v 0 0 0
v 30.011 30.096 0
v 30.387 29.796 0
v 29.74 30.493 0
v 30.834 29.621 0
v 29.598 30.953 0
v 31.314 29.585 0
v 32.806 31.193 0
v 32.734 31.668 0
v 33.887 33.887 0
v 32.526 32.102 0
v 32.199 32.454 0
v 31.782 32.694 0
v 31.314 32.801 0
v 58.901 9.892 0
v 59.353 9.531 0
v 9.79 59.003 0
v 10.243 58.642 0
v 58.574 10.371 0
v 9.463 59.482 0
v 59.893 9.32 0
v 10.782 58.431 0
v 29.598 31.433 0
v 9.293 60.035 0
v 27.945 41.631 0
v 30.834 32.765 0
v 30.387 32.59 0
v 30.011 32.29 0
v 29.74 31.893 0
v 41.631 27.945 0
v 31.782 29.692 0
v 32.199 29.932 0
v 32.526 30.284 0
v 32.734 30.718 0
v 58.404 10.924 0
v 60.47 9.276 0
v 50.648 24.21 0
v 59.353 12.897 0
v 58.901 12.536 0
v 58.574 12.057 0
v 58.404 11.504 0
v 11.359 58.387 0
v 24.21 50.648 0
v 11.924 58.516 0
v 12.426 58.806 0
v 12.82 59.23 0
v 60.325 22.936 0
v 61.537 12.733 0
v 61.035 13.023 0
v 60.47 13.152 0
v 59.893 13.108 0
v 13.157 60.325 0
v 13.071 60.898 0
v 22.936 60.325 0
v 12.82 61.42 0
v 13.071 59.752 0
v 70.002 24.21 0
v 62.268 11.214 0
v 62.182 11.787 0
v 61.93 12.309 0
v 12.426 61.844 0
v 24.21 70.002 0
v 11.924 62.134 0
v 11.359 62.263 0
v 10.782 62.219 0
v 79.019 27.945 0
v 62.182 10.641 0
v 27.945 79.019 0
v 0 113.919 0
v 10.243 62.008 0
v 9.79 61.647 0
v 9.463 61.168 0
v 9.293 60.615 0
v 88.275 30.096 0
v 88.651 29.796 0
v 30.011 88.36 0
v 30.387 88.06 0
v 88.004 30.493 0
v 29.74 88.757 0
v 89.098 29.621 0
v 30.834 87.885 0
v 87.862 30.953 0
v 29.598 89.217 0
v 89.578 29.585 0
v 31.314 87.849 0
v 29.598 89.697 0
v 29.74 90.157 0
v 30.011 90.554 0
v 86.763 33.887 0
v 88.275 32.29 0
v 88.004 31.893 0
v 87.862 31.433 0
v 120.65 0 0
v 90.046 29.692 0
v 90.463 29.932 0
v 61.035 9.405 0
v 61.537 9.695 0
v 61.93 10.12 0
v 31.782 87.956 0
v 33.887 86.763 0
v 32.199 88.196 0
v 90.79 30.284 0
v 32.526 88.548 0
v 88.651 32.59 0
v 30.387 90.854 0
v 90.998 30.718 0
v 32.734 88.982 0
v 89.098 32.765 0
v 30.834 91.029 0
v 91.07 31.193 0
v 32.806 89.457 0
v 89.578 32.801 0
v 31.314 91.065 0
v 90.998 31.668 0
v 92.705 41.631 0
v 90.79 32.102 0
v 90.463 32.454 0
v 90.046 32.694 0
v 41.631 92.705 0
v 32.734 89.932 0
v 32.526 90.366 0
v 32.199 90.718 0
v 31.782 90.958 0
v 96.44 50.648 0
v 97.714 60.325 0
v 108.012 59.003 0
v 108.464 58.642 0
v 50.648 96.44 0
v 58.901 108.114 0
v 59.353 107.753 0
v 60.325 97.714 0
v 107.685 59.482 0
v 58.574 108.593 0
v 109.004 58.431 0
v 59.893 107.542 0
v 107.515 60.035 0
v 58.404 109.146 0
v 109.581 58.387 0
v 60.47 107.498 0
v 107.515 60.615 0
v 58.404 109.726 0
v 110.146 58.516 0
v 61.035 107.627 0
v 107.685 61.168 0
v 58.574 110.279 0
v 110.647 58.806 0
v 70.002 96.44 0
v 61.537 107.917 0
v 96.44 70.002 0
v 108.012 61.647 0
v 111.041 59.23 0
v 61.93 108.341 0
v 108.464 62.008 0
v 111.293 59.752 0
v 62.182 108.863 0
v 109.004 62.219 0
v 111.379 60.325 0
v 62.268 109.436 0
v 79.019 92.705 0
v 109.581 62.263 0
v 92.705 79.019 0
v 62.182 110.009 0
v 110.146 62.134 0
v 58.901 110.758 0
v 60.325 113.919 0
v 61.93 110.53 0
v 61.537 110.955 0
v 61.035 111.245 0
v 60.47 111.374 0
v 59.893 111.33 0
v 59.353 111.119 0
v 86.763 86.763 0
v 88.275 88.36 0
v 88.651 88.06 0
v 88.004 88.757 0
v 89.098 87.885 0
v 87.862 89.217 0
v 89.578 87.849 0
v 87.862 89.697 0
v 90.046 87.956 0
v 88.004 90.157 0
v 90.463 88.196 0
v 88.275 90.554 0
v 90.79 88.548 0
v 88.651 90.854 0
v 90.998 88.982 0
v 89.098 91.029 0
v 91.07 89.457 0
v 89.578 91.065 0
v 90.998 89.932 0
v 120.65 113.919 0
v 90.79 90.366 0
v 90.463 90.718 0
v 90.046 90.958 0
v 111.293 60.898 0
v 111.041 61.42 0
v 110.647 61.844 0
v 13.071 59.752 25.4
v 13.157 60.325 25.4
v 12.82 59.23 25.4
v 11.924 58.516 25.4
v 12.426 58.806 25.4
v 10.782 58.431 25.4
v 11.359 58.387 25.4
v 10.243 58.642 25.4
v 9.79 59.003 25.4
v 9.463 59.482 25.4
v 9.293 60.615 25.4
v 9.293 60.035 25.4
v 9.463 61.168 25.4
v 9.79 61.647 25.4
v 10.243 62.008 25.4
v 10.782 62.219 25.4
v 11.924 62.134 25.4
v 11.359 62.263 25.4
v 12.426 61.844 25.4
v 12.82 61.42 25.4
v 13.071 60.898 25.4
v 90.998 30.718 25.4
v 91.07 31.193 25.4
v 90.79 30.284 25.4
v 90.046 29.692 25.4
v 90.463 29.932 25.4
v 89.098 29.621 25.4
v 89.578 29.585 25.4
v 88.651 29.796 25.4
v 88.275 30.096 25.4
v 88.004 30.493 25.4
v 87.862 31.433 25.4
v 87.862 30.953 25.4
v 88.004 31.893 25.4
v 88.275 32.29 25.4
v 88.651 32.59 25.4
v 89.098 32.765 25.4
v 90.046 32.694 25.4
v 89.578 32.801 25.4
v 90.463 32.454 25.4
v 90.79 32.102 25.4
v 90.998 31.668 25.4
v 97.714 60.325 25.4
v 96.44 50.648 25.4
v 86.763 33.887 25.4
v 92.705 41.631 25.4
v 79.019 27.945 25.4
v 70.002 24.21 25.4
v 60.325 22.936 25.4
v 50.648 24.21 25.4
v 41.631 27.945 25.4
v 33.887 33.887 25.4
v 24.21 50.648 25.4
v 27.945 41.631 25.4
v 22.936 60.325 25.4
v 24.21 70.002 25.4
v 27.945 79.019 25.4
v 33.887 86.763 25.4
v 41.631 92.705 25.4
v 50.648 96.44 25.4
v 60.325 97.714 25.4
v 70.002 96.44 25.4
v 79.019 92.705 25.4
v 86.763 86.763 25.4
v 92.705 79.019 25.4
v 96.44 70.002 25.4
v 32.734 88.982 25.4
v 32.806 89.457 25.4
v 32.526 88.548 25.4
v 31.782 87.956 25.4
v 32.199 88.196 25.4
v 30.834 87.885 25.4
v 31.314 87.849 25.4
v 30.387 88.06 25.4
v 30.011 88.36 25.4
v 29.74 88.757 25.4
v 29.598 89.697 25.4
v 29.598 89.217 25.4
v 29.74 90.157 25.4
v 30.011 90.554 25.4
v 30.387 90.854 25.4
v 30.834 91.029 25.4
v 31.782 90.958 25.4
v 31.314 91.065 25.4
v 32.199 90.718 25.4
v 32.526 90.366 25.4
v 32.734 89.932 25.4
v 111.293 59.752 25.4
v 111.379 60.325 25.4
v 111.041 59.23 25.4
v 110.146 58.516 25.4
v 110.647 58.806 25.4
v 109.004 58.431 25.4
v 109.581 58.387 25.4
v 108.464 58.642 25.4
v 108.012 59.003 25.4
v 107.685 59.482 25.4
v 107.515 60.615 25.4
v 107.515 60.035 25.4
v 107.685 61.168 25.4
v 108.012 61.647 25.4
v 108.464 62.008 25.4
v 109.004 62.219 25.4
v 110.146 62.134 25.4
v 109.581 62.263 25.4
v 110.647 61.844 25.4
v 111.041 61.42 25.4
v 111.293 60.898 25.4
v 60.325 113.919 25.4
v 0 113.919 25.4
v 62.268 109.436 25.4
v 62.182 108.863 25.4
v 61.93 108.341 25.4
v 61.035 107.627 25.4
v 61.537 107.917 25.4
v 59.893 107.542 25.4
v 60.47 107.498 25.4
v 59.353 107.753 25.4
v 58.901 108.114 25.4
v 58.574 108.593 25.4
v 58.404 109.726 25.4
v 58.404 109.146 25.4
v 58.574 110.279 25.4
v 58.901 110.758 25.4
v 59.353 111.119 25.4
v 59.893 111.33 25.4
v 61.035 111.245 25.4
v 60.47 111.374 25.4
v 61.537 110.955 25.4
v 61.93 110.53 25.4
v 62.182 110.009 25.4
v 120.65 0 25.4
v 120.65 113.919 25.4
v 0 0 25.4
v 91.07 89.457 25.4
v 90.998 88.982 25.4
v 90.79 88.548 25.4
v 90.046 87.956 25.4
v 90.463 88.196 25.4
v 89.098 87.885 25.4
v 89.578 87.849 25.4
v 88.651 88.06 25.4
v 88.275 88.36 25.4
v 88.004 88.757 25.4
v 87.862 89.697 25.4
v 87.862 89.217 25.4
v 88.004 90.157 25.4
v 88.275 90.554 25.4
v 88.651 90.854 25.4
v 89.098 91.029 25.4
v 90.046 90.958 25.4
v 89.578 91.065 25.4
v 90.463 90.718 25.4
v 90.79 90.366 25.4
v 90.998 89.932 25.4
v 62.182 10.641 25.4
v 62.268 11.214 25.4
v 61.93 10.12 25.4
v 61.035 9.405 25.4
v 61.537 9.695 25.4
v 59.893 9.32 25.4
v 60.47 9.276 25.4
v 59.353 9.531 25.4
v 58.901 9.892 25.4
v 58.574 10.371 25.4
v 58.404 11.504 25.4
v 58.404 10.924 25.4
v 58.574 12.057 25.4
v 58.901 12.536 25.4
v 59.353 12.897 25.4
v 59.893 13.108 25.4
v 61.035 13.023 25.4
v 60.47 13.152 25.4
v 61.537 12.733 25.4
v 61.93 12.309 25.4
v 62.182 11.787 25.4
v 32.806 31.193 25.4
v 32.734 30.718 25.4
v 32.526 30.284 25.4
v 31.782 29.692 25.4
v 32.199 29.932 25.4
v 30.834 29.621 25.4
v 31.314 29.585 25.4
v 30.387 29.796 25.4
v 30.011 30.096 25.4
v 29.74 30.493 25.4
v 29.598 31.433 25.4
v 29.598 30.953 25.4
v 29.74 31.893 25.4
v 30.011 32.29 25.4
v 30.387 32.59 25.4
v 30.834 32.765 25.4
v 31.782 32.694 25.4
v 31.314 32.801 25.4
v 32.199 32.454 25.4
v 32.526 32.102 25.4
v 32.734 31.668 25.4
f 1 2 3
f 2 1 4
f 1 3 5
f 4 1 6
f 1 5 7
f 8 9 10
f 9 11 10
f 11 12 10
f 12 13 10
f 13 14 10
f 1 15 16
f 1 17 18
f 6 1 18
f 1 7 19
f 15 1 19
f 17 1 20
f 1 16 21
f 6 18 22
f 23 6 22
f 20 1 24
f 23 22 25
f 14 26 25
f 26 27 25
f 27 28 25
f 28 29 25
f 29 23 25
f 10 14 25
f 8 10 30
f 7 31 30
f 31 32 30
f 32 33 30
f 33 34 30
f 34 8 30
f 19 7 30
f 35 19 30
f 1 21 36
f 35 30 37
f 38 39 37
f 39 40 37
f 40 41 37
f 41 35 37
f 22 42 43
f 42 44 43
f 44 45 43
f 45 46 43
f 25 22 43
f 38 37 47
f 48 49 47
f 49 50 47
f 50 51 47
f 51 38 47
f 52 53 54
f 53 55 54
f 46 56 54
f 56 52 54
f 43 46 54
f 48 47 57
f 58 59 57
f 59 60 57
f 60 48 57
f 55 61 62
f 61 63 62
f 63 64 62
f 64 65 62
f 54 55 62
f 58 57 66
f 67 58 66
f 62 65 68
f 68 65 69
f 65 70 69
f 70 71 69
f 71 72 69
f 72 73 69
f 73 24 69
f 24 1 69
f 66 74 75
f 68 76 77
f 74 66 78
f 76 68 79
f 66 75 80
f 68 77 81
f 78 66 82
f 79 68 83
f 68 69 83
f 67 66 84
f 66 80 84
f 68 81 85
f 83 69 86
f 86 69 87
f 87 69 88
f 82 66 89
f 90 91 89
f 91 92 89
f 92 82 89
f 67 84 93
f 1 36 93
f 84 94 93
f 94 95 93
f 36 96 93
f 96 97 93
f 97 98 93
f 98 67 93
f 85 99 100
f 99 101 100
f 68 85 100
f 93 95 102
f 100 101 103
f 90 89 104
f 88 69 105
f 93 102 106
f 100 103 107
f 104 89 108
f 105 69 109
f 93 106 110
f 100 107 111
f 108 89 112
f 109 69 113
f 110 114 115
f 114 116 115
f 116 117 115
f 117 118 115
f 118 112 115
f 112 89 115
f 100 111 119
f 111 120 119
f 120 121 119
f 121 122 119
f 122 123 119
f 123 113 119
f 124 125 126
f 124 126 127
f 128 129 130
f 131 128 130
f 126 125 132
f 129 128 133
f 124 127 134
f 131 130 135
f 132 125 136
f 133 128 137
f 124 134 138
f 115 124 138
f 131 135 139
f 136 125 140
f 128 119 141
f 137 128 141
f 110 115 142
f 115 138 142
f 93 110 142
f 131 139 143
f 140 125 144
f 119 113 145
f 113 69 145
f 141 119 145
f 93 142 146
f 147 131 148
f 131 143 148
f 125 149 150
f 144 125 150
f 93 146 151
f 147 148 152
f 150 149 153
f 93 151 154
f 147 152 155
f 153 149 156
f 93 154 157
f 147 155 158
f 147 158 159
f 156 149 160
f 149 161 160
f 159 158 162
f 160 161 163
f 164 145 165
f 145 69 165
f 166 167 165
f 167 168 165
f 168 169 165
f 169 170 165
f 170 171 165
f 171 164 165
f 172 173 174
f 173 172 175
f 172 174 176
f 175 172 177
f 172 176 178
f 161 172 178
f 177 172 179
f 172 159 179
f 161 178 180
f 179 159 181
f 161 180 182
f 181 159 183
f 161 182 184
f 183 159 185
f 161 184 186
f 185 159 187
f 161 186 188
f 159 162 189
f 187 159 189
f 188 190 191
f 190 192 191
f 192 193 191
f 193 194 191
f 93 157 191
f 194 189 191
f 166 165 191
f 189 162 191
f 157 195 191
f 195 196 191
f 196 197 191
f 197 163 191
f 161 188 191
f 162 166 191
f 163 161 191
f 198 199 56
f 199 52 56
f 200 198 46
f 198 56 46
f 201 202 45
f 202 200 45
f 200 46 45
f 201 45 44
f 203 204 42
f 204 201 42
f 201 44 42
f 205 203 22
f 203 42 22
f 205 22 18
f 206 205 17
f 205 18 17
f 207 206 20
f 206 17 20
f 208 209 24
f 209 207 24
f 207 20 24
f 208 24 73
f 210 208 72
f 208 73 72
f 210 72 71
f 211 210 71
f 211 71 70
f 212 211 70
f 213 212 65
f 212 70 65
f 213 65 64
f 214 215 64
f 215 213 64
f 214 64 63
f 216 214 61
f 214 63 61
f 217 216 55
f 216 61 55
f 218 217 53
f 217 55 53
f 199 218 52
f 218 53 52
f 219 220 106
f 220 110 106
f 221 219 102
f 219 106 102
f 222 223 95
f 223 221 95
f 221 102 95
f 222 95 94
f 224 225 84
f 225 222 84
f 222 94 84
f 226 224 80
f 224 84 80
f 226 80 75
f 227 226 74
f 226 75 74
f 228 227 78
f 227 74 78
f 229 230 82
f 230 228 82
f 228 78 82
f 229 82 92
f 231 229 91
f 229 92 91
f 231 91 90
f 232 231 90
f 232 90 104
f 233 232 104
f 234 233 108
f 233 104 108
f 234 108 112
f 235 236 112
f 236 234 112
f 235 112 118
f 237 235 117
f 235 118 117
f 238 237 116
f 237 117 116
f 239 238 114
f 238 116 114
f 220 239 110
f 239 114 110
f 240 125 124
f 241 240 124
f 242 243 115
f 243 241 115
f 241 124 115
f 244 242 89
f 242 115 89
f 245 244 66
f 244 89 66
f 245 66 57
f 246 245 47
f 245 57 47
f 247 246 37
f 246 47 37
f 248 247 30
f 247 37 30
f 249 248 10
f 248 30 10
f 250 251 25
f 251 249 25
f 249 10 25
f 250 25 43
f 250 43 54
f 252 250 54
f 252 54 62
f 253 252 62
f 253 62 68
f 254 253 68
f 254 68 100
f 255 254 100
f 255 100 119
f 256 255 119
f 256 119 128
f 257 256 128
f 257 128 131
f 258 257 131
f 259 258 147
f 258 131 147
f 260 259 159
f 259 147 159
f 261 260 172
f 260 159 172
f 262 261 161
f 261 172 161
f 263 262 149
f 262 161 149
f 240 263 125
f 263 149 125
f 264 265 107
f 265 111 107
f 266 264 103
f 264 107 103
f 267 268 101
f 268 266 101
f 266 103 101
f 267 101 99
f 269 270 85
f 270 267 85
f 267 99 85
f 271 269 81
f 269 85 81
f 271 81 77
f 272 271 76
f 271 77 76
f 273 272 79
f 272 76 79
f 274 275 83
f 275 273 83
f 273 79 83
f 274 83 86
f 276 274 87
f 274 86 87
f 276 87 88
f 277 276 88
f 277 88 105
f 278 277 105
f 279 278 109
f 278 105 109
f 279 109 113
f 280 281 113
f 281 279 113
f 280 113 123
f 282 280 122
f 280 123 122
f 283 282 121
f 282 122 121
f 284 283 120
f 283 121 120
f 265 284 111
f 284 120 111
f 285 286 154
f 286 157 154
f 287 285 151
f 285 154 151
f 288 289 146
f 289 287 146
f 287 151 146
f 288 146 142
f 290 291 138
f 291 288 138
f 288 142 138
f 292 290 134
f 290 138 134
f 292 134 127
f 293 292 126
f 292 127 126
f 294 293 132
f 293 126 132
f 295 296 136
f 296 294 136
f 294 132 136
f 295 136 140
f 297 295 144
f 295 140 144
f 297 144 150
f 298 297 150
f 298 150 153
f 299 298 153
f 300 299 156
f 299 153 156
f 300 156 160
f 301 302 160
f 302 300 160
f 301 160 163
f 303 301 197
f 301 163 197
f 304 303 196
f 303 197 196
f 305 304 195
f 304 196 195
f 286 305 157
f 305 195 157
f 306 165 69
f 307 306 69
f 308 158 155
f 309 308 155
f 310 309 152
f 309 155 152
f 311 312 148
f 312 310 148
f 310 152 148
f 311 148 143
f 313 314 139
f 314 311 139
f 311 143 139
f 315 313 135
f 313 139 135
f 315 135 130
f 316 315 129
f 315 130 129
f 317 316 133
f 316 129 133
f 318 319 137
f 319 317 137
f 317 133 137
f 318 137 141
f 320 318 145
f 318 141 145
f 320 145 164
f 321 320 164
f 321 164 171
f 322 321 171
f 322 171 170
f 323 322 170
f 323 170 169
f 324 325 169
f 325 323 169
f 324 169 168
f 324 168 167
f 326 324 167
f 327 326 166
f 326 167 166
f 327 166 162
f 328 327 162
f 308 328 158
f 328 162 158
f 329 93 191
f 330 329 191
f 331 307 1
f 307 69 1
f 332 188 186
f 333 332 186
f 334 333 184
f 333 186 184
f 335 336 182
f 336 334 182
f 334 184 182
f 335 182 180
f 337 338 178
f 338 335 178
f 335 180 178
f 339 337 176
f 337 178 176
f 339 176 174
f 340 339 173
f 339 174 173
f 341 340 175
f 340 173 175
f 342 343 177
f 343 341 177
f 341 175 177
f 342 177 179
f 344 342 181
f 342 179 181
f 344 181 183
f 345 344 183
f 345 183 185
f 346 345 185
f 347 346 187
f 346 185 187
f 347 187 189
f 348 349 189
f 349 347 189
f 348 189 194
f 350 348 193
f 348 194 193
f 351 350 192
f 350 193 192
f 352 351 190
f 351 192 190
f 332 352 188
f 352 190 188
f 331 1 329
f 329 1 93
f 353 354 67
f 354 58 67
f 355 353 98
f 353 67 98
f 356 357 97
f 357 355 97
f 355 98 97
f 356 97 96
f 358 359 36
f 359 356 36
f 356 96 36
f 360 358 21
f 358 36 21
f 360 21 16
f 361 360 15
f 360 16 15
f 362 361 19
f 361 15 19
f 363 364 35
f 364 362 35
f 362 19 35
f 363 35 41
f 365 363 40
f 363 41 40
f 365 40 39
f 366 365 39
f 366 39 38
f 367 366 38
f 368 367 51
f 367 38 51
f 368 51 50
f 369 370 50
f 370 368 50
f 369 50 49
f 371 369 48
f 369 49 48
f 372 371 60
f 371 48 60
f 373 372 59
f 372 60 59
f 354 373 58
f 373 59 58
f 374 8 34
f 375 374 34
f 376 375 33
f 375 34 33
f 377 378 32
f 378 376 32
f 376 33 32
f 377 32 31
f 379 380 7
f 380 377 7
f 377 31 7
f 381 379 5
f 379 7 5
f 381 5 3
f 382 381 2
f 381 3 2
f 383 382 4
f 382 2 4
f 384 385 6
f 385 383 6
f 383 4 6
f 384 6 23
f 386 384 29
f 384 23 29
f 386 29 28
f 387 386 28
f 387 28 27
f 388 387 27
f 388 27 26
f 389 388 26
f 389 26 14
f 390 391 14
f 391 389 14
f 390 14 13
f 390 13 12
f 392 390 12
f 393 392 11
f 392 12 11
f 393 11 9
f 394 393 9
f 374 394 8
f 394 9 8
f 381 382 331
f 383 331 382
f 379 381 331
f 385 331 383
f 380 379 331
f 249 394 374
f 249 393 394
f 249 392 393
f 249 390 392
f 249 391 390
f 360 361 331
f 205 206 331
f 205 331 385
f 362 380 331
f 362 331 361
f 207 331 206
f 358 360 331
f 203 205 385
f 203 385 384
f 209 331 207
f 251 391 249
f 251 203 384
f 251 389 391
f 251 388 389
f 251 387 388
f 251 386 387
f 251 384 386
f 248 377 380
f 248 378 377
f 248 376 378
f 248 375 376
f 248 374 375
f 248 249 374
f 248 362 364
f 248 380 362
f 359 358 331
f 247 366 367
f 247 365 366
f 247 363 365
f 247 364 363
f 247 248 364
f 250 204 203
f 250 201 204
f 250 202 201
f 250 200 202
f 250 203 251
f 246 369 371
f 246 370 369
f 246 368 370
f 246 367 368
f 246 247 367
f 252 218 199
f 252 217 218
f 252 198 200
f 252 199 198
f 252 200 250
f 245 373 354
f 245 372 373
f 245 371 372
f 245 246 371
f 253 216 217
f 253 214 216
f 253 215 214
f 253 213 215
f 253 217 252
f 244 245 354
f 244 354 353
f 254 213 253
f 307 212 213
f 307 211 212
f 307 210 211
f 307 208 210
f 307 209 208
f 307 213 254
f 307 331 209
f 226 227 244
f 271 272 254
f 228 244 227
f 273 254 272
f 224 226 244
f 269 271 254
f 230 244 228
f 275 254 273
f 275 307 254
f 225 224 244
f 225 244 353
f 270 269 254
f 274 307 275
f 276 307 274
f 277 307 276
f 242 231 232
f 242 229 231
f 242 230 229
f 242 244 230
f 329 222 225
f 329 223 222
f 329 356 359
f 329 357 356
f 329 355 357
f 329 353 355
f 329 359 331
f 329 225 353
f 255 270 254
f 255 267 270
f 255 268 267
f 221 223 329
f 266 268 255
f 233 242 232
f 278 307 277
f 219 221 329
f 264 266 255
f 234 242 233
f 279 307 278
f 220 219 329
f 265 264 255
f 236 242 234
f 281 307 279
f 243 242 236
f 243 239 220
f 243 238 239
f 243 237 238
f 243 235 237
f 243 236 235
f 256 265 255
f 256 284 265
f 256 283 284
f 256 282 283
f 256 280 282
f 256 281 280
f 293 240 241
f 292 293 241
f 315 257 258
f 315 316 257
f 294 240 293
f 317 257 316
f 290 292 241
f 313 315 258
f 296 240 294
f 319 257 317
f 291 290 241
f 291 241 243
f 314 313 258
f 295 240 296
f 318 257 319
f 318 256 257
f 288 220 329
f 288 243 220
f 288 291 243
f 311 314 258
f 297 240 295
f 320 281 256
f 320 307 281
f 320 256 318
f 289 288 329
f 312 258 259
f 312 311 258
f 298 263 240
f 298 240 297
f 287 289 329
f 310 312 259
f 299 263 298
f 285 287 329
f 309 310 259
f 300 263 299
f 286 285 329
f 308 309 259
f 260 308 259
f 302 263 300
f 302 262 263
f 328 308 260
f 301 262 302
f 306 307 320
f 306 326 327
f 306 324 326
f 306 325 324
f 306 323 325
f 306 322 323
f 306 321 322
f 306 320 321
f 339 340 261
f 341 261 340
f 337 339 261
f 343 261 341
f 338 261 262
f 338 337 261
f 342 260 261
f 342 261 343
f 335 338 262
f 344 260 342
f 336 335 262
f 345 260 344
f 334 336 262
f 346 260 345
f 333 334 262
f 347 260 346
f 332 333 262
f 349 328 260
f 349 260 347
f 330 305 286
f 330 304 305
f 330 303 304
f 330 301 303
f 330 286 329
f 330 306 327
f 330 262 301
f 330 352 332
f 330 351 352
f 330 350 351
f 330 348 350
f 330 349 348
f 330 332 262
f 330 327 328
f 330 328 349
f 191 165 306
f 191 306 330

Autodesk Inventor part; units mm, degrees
ref_plane "YZ Plane" through (0, 0, 0) normal (1, 0, 0) x (0, 1, 0)
ref_plane "XZ Plane" through (0, 0, 0) normal (0, 1, 0) x (-1, 0, 0)
ref_plane "XY Plane" through (0, 0, 0) normal (0, 0, 1) x (1, 0, 0)
sketch "Sketch1" plane through (0, 0, 0) normal (0, 0, 1) x (1, 0, 0)
  line L0 (0, 0) -> (120.65, 0)
  line L1 (120.65, 0) -> (120.65, 113.919)
  line L2 (0, 113.919) -> (0, 0)
  circle A0 centre (11.2141, 60.325) radius 1.9431
  circle A1 centre (60.325, 11.2141) radius 1.9431
  circle A2 centre (109.4359, 60.325) radius 1.9431
  circle A3 centre (60.325, 109.4359) radius 1.9431
  circle A4 centre (60.325, 60.325) radius 37.3888
  circle A5 centre (31.193, 89.457) radius 1.6129
  circle A6 centre (31.193, 31.193) radius 1.6129
  circle A7 centre (89.457, 31.193) radius 1.6129
  circle A8 centre (89.457, 89.457) radius 1.6129
  line L3 (60.325, 113.919) -> (120.65, 113.919)
  line L4 (60.325, 113.919) -> (0, 113.919)
  dimension "d10" = 3.8862
  dimension "d13" = 360
  dimension "d18" = 74.7776
  dimension "d20" = 3.2258
  dimension "d23" = 360
  dimension "d32" = 4.4831
extrude "Extrusion3" add sketch "Sketch1" along normal blind 25.4
properties part number "speakerside"
